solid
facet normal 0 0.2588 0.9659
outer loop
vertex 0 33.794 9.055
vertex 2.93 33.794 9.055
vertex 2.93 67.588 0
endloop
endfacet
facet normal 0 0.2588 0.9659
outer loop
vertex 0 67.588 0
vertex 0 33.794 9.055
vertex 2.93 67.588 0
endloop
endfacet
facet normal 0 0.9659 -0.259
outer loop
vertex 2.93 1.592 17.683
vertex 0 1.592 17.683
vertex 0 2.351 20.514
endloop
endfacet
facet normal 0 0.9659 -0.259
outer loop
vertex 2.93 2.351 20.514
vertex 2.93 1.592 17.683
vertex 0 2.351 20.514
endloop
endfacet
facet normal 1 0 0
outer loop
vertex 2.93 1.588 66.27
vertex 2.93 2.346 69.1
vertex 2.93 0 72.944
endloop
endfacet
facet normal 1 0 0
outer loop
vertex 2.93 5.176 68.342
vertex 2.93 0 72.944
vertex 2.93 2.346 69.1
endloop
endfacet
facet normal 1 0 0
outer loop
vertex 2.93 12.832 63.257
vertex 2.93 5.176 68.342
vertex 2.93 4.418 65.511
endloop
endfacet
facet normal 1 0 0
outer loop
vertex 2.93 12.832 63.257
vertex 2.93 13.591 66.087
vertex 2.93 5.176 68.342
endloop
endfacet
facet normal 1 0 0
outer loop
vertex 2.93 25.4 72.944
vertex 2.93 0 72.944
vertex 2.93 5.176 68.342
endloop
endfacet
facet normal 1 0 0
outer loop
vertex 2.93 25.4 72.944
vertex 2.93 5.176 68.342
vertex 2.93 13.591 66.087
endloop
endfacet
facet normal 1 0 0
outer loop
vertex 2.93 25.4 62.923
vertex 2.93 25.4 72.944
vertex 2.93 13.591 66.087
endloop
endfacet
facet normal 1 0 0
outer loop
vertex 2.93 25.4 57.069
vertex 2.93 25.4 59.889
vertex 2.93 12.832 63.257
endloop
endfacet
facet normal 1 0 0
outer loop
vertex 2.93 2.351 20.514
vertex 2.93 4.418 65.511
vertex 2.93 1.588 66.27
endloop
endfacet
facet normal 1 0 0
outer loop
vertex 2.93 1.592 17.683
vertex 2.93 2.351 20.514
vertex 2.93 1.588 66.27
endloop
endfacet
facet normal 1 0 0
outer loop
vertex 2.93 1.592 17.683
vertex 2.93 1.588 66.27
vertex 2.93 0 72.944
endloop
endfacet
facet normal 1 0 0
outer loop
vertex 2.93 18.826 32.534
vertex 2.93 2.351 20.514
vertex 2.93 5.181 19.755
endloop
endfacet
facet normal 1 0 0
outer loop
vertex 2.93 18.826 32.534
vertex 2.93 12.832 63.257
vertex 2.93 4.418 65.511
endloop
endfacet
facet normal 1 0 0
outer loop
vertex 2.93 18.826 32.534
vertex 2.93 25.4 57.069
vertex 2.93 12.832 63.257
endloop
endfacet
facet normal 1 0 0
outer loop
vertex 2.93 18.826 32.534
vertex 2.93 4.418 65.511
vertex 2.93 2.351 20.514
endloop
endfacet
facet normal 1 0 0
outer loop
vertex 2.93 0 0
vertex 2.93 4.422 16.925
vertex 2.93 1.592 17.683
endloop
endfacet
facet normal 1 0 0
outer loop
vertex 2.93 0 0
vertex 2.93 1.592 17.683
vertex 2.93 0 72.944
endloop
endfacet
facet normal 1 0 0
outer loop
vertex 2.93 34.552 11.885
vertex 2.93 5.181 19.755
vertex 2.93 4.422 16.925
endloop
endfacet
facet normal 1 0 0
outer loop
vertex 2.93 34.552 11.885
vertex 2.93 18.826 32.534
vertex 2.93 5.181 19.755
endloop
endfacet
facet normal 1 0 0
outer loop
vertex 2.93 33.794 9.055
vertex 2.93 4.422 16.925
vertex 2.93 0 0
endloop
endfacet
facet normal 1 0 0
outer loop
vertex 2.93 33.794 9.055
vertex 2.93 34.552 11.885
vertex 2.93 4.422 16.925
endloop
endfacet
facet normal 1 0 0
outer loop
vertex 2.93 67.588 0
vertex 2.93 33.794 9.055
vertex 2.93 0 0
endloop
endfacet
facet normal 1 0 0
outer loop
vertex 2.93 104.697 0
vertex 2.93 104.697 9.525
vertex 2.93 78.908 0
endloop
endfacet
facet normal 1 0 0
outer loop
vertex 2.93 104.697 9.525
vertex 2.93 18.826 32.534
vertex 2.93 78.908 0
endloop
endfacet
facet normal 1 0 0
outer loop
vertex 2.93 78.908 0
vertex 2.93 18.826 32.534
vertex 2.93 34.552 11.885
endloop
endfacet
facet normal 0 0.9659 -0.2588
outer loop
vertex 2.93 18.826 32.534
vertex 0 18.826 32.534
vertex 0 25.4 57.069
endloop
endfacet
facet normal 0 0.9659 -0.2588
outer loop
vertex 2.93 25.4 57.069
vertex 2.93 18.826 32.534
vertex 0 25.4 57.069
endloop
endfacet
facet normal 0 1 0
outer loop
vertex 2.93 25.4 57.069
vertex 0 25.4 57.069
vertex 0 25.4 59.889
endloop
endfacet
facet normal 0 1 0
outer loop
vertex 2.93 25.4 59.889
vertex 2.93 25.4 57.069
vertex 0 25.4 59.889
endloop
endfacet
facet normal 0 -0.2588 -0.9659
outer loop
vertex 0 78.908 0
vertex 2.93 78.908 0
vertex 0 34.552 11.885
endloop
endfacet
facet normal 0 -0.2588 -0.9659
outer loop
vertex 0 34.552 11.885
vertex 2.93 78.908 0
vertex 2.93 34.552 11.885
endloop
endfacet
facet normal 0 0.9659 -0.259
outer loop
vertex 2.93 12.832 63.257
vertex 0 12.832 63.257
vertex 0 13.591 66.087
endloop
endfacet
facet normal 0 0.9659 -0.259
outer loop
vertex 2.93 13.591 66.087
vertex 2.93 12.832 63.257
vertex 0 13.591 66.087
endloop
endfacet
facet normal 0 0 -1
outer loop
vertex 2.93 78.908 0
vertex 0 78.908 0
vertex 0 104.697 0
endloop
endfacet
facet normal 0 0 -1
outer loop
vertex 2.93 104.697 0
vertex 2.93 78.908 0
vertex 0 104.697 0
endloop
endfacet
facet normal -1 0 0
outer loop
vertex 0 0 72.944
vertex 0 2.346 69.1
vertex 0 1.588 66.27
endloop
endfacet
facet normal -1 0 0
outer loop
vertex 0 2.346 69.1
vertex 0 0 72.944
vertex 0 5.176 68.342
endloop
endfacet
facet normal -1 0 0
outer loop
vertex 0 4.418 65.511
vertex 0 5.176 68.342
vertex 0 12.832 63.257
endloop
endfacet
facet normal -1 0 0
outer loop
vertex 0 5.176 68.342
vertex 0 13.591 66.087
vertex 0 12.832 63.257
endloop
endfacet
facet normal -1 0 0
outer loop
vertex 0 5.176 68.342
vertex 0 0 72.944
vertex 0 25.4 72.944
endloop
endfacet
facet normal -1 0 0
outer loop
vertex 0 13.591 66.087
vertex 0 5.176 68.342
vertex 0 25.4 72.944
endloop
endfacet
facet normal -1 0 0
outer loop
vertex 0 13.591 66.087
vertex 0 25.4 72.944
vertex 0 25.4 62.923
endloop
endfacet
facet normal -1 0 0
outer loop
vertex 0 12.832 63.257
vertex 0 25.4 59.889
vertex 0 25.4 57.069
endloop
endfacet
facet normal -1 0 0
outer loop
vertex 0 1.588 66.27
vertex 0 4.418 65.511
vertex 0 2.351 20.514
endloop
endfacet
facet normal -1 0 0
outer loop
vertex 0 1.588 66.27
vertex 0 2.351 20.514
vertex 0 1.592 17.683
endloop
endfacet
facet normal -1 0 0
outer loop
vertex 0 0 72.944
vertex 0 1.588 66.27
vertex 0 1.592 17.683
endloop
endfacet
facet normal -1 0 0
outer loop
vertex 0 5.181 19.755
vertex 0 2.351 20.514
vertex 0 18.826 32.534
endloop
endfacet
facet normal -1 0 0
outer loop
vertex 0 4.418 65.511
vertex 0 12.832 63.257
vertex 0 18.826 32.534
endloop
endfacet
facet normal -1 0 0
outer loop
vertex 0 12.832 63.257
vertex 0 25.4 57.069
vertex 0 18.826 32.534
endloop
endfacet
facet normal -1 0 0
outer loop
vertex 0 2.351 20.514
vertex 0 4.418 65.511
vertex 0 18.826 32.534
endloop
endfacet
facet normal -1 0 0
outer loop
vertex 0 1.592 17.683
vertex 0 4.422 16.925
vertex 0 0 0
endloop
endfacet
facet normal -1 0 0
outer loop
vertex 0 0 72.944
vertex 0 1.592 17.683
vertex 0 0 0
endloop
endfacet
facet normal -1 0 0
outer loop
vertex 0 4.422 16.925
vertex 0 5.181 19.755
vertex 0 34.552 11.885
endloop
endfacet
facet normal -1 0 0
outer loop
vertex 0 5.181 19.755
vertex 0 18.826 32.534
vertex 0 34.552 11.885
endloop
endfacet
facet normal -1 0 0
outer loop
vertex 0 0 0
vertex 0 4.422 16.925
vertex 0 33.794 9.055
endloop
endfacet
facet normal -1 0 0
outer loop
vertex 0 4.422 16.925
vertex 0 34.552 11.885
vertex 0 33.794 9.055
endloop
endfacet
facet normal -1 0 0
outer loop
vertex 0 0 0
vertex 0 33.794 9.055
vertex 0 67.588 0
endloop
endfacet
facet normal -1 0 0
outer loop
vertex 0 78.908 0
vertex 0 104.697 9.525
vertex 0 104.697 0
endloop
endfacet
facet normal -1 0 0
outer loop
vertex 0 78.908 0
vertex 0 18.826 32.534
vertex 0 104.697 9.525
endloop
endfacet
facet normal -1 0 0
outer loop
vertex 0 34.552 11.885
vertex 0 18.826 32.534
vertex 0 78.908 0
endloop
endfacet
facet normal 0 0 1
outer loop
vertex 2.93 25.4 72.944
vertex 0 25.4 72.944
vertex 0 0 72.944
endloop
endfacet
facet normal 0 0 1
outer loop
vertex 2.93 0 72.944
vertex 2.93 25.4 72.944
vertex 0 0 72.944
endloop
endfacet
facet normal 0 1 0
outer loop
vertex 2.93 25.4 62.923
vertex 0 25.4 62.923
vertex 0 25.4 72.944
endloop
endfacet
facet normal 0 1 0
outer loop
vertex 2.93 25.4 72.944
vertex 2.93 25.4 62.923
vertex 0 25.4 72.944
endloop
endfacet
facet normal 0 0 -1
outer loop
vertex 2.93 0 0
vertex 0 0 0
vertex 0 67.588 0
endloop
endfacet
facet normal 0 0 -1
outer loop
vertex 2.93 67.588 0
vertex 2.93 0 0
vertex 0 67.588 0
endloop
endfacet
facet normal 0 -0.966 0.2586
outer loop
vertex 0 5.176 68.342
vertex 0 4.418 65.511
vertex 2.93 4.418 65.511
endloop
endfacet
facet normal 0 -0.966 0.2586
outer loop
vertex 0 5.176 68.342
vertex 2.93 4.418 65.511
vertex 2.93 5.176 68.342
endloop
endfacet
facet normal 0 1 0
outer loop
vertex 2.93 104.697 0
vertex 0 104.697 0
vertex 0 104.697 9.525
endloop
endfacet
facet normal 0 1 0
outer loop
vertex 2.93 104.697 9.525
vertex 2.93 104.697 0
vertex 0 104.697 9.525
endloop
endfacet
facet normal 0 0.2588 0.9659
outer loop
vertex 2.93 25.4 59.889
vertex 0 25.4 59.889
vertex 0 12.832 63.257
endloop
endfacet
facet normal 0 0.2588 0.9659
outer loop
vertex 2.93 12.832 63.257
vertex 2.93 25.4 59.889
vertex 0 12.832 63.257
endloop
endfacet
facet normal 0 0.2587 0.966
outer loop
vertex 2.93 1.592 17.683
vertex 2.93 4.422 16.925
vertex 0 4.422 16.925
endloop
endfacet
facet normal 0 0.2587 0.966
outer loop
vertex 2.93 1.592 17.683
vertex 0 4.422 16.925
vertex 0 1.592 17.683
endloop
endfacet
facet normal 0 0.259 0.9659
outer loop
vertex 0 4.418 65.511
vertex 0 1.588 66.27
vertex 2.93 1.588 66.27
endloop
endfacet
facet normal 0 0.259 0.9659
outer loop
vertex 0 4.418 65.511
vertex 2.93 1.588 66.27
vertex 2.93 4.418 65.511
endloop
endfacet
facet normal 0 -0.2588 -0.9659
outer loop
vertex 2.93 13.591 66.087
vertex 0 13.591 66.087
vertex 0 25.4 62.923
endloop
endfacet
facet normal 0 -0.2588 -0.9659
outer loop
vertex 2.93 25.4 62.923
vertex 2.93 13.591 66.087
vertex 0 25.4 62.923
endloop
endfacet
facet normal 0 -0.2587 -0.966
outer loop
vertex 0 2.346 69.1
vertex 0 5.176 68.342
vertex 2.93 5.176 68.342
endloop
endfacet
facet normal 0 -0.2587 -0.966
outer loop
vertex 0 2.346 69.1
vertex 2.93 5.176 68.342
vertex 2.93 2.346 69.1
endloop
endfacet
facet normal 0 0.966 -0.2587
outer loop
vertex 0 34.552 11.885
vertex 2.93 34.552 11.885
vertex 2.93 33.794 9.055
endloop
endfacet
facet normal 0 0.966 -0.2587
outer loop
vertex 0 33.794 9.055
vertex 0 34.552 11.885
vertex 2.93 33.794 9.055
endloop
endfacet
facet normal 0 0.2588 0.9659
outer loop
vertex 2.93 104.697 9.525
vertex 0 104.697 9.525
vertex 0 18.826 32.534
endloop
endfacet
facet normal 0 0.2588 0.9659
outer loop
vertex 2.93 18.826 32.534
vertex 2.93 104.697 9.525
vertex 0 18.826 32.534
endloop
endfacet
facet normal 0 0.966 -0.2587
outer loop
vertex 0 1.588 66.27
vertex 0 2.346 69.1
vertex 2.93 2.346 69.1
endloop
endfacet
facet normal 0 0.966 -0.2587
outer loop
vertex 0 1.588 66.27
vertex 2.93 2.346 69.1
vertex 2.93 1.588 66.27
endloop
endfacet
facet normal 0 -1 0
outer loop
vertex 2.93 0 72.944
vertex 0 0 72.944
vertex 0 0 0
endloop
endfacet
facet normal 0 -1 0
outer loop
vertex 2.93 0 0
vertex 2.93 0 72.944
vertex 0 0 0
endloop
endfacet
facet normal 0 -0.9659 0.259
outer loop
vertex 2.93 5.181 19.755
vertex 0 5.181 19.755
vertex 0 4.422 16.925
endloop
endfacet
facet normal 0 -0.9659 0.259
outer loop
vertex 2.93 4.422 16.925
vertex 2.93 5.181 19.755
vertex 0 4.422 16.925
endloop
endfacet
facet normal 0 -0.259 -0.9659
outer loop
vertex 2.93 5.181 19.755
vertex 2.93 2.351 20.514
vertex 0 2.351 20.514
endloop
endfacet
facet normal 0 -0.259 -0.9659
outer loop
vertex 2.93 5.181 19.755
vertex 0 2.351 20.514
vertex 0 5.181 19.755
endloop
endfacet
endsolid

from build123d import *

# Parameters (mm, degrees)
BOSS_EXTRUDE1_DEPTH = 2.93
CUT_EXTRUDE4_DEPTH  = 3.93
CUT_EXTRUDE6_DEPTH  = 3.93
CUT_EXTRUDE7_DEPTH  = 3.93
CUT_EXTRUDE9_DEPTH  = 3.93


with BuildPart() as part:
    # Sketch1 → Boss-Extrude1 (new body)
    with BuildSketch(Plane(origin=(0, 0, 0), x_dir=(0, 0, -1), z_dir=(1, 0, 0))):
        Polygon((0, 0), (0, 104.696802211), (-9.525, 104.696802211), (-32.53401311, 18.825996254), (-57.068529097, 25.4), (-72.943529097, 25.4), (-72.943529097, 0), align=None)
    extrude(amount=BOSS_EXTRUDE1_DEPTH)

    # Sketch5 → Cut-Extrude4 (cut, through all)
    with BuildSketch(Plane(origin=(2.93, 0, 0), x_dir=(0, 0, -1), z_dir=(1, 0, 0))):
        Polygon((0, 67.5876455), (0, 78.908296184), (-11.885190186, 34.552162552), (-9.055027515, 33.79382275), align=None)
    extrude(amount=-CUT_EXTRUDE4_DEPTH, mode=Mode.SUBTRACT)

    # Sketch7 → Cut-Extrude6 (cut, through all)
    with BuildSketch(Plane.ZY):
        Polygon((63.256615243, 12.832490583), (66.086777914, 13.590830386), (62.719323915, 26.158339802), (59.889161244, 25.4), align=None)
    extrude(amount=-CUT_EXTRUDE6_DEPTH, mode=Mode.SUBTRACT)

    # Sketch9 → Cut-Extrude7 (cut, through all)
    with BuildSketch(Plane.ZY):
        Polygon((65.511361587, 4.417662671), (68.341524258, 5.176002473), (69.09986406, 2.345839802), (66.269701389, 1.5875), align=None)
    extrude(amount=-CUT_EXTRUDE7_DEPTH, mode=Mode.SUBTRACT)

    # Sketch11 → Cut-Extrude9 (cut, through all)
    with BuildSketch(Plane.ZY):
        Polygon((17.683407431, 1.592270516), (20.513570102, 2.350610318), (19.7552303, 5.180772989), (16.925067629, 4.422433187), align=None)
    extrude(amount=-CUT_EXTRUDE9_DEPTH, mode=Mode.SUBTRACT)


solid = part.part
